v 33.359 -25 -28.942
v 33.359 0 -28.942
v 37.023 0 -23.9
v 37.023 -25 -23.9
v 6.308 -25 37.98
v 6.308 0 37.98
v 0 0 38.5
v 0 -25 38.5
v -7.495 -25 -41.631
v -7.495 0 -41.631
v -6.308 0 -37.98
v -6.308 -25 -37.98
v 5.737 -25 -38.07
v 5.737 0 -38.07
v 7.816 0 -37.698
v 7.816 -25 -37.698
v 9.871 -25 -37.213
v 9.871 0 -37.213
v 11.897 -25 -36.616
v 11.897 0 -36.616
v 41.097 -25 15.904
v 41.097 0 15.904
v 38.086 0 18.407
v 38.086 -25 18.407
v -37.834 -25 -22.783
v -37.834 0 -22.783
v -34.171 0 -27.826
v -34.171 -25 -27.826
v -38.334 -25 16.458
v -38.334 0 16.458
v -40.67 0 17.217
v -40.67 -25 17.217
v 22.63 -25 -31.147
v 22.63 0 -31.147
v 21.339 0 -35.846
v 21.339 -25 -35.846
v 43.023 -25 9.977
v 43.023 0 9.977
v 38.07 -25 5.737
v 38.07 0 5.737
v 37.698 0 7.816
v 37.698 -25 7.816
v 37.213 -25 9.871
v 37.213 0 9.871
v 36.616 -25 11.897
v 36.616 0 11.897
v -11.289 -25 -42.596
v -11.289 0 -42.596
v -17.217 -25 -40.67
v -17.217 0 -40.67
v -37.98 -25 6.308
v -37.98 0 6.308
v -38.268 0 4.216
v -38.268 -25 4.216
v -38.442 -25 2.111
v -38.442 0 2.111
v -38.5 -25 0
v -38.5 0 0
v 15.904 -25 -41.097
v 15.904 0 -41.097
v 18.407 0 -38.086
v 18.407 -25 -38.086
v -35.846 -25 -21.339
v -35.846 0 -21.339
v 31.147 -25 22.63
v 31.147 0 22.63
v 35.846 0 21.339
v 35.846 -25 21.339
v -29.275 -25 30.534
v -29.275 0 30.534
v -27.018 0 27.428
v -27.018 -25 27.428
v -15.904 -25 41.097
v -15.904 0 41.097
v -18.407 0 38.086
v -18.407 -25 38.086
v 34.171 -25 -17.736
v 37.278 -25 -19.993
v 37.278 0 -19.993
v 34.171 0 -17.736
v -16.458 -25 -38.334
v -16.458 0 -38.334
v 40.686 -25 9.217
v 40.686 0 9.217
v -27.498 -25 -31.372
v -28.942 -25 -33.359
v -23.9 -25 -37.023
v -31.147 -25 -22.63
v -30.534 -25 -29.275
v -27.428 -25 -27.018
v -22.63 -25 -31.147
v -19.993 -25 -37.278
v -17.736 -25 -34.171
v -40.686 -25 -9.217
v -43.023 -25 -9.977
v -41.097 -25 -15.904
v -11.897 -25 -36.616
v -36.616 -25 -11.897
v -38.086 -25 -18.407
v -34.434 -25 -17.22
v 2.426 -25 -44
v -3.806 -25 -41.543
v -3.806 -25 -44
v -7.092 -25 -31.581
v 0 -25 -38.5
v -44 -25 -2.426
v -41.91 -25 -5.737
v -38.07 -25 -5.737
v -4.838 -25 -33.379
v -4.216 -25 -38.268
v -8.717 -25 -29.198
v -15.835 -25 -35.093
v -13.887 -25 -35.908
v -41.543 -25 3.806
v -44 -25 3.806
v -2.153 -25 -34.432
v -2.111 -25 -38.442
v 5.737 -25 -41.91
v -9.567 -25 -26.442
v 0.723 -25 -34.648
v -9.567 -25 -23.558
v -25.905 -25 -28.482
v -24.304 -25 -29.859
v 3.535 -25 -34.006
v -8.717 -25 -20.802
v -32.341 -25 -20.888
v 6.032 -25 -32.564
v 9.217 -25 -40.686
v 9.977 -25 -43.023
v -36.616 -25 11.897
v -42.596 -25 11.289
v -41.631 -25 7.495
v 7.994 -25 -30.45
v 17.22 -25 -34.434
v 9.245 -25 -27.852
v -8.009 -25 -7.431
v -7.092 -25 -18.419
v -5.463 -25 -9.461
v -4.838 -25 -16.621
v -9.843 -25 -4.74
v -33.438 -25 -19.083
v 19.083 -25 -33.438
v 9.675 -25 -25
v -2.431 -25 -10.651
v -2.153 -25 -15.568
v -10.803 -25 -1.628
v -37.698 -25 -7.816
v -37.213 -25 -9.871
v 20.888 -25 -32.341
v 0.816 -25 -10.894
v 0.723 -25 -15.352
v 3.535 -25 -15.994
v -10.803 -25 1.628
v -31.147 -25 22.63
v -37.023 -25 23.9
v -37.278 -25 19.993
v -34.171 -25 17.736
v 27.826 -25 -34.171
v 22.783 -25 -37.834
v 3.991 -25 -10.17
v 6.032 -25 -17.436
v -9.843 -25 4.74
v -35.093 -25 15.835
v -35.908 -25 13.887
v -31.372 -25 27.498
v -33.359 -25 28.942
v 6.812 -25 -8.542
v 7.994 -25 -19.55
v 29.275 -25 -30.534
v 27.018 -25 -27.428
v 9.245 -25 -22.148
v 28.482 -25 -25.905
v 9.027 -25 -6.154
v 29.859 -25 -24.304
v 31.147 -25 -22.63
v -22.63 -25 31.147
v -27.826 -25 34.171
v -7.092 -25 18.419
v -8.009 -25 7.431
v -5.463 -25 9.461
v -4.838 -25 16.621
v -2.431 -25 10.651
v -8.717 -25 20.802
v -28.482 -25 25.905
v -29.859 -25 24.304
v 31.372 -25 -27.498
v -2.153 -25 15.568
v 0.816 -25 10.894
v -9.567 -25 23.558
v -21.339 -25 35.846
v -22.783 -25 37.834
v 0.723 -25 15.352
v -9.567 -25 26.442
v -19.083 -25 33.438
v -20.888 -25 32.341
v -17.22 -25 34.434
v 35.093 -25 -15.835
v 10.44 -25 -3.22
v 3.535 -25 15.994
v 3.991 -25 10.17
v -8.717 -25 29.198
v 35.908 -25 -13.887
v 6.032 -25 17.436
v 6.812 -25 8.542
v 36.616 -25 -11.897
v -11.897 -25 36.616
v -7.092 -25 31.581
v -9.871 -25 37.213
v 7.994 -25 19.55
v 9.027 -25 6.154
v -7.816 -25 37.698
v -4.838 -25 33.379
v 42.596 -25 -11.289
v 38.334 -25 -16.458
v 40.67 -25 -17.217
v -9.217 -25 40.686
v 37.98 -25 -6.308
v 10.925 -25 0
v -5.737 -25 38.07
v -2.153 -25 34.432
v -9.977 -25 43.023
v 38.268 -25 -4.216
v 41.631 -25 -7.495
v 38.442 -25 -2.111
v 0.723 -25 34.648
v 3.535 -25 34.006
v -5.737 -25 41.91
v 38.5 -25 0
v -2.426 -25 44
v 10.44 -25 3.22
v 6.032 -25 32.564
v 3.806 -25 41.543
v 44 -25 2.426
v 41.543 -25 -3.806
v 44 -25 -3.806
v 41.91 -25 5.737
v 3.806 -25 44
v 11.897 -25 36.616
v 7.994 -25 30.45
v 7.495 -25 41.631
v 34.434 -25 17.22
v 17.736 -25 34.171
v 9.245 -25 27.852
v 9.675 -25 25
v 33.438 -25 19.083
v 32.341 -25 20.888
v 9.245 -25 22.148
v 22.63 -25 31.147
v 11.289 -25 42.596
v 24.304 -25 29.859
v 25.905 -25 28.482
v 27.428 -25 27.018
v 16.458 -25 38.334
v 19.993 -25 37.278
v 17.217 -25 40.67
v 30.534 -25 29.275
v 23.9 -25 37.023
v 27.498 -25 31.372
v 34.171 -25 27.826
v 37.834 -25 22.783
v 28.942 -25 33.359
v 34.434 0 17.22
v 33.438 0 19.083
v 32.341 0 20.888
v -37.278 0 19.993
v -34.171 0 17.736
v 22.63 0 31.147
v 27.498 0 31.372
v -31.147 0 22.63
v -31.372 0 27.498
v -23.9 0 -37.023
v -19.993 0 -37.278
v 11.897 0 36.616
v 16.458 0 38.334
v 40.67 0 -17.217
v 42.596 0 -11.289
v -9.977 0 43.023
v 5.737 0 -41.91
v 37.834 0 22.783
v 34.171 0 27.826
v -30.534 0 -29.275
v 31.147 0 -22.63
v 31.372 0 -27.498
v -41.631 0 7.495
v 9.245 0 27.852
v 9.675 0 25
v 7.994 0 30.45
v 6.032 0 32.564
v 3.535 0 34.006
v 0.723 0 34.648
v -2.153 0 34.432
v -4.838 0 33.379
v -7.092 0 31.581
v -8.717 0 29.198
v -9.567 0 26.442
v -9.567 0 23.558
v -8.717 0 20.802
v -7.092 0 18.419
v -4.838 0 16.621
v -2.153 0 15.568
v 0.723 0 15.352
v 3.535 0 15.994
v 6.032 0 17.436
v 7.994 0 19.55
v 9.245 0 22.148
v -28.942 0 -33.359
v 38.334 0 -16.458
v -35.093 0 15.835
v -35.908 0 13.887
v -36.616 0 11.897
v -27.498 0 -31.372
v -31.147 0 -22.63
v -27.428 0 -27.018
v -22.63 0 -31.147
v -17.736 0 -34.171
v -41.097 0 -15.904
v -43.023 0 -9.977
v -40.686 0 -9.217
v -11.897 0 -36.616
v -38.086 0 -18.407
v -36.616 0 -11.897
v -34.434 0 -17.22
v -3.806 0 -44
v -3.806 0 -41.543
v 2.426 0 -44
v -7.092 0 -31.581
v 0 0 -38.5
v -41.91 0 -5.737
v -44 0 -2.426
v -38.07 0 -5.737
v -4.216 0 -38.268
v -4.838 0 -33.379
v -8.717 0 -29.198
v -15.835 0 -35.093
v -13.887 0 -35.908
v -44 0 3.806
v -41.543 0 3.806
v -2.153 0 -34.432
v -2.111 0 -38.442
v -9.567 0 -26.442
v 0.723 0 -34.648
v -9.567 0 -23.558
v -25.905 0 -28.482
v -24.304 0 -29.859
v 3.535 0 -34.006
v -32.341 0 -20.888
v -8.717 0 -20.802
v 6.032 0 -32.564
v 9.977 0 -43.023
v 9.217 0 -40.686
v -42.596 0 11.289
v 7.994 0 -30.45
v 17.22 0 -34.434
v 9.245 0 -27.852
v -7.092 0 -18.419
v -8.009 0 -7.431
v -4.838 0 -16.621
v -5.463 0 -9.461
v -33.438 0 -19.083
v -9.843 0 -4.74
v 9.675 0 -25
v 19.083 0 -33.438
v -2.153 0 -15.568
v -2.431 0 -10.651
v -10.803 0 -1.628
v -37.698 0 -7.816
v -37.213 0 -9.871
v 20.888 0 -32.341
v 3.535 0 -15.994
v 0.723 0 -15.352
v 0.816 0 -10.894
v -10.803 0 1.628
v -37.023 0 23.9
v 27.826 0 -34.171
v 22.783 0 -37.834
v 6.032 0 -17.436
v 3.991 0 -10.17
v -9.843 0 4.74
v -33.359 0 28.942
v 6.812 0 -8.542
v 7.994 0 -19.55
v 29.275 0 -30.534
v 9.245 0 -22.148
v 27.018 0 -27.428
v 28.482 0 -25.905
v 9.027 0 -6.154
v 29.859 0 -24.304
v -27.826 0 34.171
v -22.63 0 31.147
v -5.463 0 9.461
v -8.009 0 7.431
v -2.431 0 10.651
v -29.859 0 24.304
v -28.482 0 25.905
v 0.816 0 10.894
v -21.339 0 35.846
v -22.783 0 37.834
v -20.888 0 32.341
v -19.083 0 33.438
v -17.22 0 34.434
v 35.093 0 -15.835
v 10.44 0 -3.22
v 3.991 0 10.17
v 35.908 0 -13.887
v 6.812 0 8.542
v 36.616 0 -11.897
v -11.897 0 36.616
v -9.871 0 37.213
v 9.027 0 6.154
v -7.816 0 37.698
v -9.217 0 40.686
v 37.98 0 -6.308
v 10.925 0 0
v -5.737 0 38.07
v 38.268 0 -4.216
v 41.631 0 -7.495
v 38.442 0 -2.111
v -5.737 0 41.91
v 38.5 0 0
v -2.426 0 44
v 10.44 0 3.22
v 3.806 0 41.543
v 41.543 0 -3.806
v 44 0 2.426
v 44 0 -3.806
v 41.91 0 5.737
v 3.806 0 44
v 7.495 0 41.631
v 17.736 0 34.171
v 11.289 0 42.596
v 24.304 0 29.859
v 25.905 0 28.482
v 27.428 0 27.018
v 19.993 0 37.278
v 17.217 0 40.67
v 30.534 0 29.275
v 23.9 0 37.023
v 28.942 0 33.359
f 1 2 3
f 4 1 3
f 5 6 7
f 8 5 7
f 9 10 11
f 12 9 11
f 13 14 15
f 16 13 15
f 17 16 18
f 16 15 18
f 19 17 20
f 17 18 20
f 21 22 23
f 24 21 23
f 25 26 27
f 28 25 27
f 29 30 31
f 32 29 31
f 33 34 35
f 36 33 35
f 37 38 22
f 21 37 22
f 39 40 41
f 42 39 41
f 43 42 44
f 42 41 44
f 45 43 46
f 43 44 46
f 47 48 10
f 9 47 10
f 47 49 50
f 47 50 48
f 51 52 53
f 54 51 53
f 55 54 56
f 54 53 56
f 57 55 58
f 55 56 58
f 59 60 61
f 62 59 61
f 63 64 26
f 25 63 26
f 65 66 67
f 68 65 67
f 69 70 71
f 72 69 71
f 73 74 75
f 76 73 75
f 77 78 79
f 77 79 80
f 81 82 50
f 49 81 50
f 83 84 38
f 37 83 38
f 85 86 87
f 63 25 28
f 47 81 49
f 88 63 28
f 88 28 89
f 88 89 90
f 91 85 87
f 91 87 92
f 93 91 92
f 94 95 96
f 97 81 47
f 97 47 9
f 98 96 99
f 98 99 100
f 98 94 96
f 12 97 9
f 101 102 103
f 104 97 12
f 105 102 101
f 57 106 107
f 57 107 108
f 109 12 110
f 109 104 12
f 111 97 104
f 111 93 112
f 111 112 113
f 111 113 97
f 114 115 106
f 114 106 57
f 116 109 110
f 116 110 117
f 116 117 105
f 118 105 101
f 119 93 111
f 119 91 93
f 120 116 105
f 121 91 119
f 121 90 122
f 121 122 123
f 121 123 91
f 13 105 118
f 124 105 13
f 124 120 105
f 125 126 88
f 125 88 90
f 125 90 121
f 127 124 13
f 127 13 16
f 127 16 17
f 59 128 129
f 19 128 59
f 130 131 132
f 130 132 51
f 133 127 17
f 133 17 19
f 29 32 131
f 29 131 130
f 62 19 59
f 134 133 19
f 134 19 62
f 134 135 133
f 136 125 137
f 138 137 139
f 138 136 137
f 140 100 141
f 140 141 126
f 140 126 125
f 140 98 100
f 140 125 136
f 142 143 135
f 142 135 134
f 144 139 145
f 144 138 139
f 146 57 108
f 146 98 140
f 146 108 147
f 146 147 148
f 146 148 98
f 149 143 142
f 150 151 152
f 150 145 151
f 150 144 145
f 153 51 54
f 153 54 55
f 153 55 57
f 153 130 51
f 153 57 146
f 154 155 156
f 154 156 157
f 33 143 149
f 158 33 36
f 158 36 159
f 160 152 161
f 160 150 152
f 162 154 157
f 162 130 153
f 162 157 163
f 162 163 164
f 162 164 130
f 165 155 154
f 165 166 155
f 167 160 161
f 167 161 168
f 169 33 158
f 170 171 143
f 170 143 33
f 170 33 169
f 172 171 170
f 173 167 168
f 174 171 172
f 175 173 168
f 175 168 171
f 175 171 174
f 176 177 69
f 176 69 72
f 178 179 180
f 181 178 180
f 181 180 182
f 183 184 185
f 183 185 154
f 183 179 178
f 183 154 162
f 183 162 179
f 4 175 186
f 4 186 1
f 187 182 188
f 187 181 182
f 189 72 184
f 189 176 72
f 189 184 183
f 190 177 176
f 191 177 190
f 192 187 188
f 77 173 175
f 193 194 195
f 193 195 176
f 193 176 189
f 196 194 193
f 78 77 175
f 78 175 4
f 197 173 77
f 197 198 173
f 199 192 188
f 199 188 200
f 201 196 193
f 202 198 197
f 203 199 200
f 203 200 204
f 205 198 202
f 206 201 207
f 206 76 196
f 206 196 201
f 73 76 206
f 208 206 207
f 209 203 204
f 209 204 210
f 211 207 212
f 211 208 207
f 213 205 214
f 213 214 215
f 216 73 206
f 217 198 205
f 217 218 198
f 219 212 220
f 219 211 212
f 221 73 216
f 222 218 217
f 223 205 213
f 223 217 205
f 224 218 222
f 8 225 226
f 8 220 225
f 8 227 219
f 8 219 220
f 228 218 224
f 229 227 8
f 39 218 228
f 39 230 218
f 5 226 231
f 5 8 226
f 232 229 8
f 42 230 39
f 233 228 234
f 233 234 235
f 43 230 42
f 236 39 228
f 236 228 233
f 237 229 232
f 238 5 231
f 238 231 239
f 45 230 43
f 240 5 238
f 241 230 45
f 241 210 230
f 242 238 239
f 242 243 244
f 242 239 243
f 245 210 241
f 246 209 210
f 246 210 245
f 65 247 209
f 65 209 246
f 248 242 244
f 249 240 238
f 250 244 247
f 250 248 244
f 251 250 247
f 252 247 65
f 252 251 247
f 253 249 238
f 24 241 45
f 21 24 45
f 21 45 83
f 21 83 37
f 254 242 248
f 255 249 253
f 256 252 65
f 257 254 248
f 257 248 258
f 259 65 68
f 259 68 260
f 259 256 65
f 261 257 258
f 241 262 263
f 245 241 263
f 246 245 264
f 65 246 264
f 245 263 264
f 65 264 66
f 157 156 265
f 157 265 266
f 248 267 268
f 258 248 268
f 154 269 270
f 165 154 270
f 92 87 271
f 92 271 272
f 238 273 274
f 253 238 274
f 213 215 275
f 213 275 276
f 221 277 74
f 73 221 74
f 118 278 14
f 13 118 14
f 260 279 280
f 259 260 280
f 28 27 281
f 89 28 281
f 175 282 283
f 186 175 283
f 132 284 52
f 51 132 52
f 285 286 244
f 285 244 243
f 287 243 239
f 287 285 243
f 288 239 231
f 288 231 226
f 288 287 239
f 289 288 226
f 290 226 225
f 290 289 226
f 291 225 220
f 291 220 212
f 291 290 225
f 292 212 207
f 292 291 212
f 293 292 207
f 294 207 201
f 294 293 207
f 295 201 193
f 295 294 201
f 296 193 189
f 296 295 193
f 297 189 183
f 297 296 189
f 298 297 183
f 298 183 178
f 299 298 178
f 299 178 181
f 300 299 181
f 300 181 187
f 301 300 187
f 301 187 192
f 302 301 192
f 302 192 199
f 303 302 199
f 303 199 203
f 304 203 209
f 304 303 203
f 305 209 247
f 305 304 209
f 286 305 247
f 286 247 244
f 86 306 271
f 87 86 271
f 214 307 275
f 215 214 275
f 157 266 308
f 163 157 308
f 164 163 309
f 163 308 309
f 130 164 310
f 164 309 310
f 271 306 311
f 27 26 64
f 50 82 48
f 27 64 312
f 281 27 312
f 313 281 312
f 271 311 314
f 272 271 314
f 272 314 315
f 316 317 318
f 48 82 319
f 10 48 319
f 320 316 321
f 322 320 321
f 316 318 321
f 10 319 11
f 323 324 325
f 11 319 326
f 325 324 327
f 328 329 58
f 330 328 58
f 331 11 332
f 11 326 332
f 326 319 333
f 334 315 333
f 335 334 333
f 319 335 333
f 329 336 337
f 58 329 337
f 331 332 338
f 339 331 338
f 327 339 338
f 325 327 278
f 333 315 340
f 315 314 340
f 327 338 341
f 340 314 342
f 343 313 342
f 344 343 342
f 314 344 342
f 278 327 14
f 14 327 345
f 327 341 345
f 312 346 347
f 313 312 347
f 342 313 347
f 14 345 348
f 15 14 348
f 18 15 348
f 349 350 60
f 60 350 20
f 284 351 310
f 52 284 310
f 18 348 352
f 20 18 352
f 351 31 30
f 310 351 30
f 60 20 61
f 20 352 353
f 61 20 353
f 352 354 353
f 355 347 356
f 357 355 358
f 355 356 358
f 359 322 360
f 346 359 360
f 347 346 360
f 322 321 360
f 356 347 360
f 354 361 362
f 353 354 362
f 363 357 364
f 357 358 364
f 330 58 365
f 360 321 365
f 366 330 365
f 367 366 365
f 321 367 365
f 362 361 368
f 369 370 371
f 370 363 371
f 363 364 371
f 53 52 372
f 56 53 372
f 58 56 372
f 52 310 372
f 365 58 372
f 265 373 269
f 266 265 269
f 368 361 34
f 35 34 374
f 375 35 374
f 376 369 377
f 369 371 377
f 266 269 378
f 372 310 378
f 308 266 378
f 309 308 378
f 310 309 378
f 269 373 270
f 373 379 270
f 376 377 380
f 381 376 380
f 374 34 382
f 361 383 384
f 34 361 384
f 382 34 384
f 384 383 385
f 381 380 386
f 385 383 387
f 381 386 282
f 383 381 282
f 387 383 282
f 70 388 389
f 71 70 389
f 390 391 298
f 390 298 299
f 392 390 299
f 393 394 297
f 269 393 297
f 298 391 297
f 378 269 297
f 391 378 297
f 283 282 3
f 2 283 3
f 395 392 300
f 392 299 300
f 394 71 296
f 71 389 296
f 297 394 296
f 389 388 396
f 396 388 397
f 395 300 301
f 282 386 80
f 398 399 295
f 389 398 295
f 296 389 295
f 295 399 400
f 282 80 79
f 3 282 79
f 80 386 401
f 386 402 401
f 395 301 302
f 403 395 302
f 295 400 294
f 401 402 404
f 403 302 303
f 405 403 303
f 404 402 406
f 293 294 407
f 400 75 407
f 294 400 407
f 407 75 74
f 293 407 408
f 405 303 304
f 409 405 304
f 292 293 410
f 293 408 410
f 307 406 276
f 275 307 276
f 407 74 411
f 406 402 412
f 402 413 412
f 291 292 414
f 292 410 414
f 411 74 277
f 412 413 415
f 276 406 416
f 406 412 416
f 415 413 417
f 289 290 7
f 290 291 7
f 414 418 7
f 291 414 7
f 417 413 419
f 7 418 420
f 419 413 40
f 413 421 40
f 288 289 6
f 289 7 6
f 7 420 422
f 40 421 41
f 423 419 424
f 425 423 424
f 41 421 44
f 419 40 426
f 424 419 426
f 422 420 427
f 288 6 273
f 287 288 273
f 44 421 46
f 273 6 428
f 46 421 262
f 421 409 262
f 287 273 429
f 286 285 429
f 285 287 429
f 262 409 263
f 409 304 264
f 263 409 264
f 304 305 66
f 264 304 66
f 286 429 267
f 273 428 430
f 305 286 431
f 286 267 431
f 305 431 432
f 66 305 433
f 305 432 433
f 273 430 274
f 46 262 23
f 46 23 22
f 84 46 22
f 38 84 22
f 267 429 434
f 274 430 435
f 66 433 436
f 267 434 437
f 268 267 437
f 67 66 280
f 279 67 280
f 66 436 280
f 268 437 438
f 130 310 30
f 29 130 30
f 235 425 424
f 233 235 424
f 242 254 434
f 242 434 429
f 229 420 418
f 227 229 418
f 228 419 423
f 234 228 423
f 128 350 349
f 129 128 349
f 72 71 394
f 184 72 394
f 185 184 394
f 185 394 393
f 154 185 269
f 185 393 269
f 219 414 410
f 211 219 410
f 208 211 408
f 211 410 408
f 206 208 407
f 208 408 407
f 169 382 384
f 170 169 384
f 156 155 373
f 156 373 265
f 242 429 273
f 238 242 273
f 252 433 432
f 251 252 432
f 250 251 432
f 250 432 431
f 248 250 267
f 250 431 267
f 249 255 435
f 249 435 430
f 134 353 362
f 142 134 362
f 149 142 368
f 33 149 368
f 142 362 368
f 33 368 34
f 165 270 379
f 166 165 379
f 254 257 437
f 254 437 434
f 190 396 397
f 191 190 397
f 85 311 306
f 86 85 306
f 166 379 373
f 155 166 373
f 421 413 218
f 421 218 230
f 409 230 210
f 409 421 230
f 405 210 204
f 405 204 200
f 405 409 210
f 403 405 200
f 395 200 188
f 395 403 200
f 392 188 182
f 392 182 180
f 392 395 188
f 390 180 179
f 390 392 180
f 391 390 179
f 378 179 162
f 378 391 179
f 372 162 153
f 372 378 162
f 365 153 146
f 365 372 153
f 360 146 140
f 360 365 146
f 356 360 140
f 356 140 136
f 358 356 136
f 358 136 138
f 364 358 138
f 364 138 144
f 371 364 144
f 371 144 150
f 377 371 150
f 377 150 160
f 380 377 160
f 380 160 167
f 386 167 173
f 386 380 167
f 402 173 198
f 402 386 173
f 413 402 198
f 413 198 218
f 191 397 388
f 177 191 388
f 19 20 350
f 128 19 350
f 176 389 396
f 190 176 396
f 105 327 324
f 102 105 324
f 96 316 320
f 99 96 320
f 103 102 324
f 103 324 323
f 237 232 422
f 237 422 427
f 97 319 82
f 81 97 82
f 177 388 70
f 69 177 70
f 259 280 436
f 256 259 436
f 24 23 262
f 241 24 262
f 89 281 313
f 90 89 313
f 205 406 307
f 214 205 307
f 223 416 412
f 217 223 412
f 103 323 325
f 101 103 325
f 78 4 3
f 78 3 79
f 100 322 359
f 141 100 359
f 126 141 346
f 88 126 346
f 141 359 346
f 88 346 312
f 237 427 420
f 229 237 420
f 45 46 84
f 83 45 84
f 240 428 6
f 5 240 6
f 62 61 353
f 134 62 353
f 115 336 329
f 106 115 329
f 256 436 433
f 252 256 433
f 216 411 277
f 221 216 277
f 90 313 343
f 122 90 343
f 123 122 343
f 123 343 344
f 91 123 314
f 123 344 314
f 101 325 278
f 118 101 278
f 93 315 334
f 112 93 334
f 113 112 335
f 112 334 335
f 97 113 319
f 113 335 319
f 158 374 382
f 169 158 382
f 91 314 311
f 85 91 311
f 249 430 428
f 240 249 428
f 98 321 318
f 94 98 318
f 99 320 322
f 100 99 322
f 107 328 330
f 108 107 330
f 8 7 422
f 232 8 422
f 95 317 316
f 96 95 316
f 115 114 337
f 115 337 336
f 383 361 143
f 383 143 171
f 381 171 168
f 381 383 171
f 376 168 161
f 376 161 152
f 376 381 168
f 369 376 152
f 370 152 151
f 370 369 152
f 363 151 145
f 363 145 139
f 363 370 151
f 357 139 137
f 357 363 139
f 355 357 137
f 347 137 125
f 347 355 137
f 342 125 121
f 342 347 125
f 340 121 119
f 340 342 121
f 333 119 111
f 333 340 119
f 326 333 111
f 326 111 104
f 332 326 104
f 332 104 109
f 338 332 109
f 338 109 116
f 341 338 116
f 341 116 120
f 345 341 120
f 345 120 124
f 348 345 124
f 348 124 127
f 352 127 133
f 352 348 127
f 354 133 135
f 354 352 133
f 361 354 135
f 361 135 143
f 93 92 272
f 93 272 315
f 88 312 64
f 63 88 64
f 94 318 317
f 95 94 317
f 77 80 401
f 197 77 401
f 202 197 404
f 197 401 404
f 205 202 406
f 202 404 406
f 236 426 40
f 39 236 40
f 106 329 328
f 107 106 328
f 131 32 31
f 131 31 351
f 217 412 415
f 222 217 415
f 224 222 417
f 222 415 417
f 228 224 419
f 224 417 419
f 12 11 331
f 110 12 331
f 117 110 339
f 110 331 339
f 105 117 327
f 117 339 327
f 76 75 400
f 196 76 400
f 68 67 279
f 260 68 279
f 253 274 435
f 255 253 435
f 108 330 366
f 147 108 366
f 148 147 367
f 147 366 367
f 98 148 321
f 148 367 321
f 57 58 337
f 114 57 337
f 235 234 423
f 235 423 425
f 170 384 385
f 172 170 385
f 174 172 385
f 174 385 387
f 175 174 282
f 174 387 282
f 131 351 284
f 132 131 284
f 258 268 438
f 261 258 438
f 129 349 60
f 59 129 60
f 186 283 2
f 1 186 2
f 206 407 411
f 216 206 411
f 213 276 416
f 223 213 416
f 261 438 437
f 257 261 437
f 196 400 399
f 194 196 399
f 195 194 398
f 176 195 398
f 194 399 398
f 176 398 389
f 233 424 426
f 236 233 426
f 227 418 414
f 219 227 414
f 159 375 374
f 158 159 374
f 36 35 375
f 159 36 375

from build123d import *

# Parameters (mm, degrees)
F0_R     = 9.675
F0_R_2   = 10.925
F1_DEPTH = 25


with BuildPart() as f1:
    # F0 (on Front) → F1 (new body)
    with BuildSketch(Plane.XZ):
        with BuildLine():
            Line((3.806459, 44), (-2.426446, 44))
            Line((-2.426446, 44), (-5.736627, 41.90996))
            Line((-5.736627, 41.90996), (-5.736627, 38.070213))
            ThreePointArc((-5.736627, 38.070213), (-8.846834, 37.469768), (-11.897154, 36.615676))
            Line((-11.897154, 36.615676), (-9.217365, 40.686093))
            Line((-9.217365, 40.686093), (-9.97659, 43.022747))
            Line((-9.97659, 43.022747), (-15.904435, 41.096674))
            Line((-15.904435, 41.096674), (-18.406746, 38.086026))
            Line((-18.406746, 38.086026), (-17.220199, 34.434209))
            ThreePointArc((-17.220199, 34.434209), (-19.992635, 32.902045), (-22.629732, 31.147154))
            Line((-22.629732, 31.147154), (-21.338929, 35.846452))
            Line((-21.338929, 35.846452), (-22.783061, 37.834129))
            Line((-22.783061, 37.834129), (-27.825587, 34.170519))
            Line((-27.825587, 34.170519), (-29.275085, 30.533966))
            Line((-29.275085, 30.533966), (-27.018138, 27.427545))
            ThreePointArc((-27.018138, 27.427545), (-29.181416, 25.11364), (-31.147154, 22.629732))
            Line((-31.147154, 22.629732), (-31.37169, 27.49791))
            Line((-31.37169, 27.49791), (-33.359367, 28.942042))
            Line((-33.359367, 28.942042), (-37.022977, 23.899515))
            Line((-37.022977, 23.899515), (-37.277775, 19.993028))
            Line((-37.277775, 19.993028), (-34.171354, 17.736081))
            ThreePointArc((-34.171354, 17.736081), (-35.513718, 14.866938), (-36.615676, 11.897154))
            Line((-36.615676, 11.897154), (-38.333572, 16.457681))
            Line((-38.333572, 16.457681), (-40.670226, 17.216906))
            Line((-40.670226, 17.216906), (-42.5963, 11.289061))
            Line((-42.5963, 11.289061), (-41.631456, 7.495034))
            Line((-41.631456, 7.495034), (-37.979639, 6.308487))
            ThreePointArc((-37.979639, 6.308487), (-38.369689, 3.164956), (-38.5, 0))
            Line((-38.5, 0), (-41.543096, 3.806459))
            Line((-41.543096, 3.806459), (-44, 3.806459))
            Line((-44, 3.806459), (-44, -2.426446))
            Line((-44, -2.426446), (-41.90996, -5.736627))
            Line((-41.90996, -5.736627), (-38.070213, -5.736627))
            ThreePointArc((-38.070213, -5.736627), (-37.469768, -8.846834), (-36.615676, -11.897154))
            Line((-36.615676, -11.897154), (-40.686093, -9.217365))
            Line((-40.686093, -9.217365), (-43.022747, -9.97659))
            Line((-43.022747, -9.97659), (-41.096674, -15.904435))
            Line((-41.096674, -15.904435), (-38.086026, -18.406746))
            Line((-38.086026, -18.406746), (-34.434209, -17.220199))
            ThreePointArc((-34.434209, -17.220199), (-32.902045, -19.992635), (-31.147154, -22.629732))
            Line((-31.147154, -22.629732), (-35.846452, -21.338929))
            Line((-35.846452, -21.338929), (-37.834129, -22.783061))
            Line((-37.834129, -22.783061), (-34.170519, -27.825587))
            Line((-34.170519, -27.825587), (-30.533966, -29.275085))
            Line((-30.533966, -29.275085), (-27.427545, -27.018138))
            ThreePointArc((-27.427545, -27.018138), (-25.11364, -29.181416), (-22.629732, -31.147154))
            Line((-22.629732, -31.147154), (-27.49791, -31.37169))
            Line((-27.49791, -31.37169), (-28.942042, -33.359367))
            Line((-28.942042, -33.359367), (-23.899515, -37.022977))
            Line((-23.899515, -37.022977), (-19.993028, -37.277775))
            Line((-19.993028, -37.277775), (-17.736081, -34.171354))
            ThreePointArc((-17.736081, -34.171354), (-14.866938, -35.513718), (-11.897154, -36.615676))
            Line((-11.897154, -36.615676), (-16.457681, -38.333572))
            Line((-16.457681, -38.333572), (-17.216906, -40.670226))
            Line((-17.216906, -40.670226), (-11.289061, -42.5963))
            Line((-11.289061, -42.5963), (-7.495034, -41.631456))
            Line((-7.495034, -41.631456), (-6.308487, -37.979639))
            ThreePointArc((-6.308487, -37.979639), (-3.164956, -38.369689), (0, -38.5))
            Line((0, -38.5), (-3.806459, -41.543096))
            Line((-3.806459, -41.543096), (-3.806459, -44))
            Line((-3.806459, -44), (2.426446, -44))
            Line((2.426446, -44), (5.736627, -41.90996))
            Line((5.736627, -41.90996), (5.736627, -38.070213))
            ThreePointArc((5.736627, -38.070213), (8.846834, -37.469768), (11.897154, -36.615676))
            Line((11.897154, -36.615676), (9.217365, -40.686093))
            Line((9.217365, -40.686093), (9.97659, -43.022747))
            Line((9.97659, -43.022747), (15.904435, -41.096674))
            Line((15.904435, -41.096674), (18.406746, -38.086026))
            Line((18.406746, -38.086026), (17.220199, -34.434209))
            ThreePointArc((17.220199, -34.434209), (19.992635, -32.902045), (22.629732, -31.147154))
            Line((22.629732, -31.147154), (21.338929, -35.846452))
            Line((21.338929, -35.846452), (22.783061, -37.834129))
            Line((22.783061, -37.834129), (27.825587, -34.170519))
            Line((27.825587, -34.170519), (29.275085, -30.533966))
            Line((29.275085, -30.533966), (27.018138, -27.427545))
            ThreePointArc((27.018138, -27.427545), (29.181416, -25.11364), (31.147154, -22.629732))
            Line((31.147154, -22.629732), (31.37169, -27.49791))
            Line((31.37169, -27.49791), (33.359367, -28.942042))
            Line((33.359367, -28.942042), (37.022977, -23.899515))
            Line((37.022977, -23.899515), (37.277775, -19.993028))
            Line((37.277775, -19.993028), (34.171354, -17.736081))
            ThreePointArc((34.171354, -17.736081), (35.513718, -14.866938), (36.615676, -11.897154))
            Line((36.615676, -11.897154), (38.333572, -16.457681))
            Line((38.333572, -16.457681), (40.670226, -17.216906))
            Line((40.670226, -17.216906), (42.5963, -11.289061))
            Line((42.5963, -11.289061), (41.631456, -7.495034))
            Line((41.631456, -7.495034), (37.979639, -6.308487))
            ThreePointArc((37.979639, -6.308487), (38.369689, -3.164956), (38.5, 0))
            Line((38.5, 0), (41.543096, -3.806459))
            Line((41.543096, -3.806459), (44, -3.806459))
            Line((44, -3.806459), (44, 2.426446))
            Line((44, 2.426446), (41.90996, 5.736627))
            Line((41.90996, 5.736627), (38.070213, 5.736627))
            ThreePointArc((38.070213, 5.736627), (37.469768, 8.846834), (36.615676, 11.897154))
            Line((36.615676, 11.897154), (40.686093, 9.217365))
            Line((40.686093, 9.217365), (43.022747, 9.97659))
            Line((43.022747, 9.97659), (41.096674, 15.904435))
            Line((41.096674, 15.904435), (38.086026, 18.406746))
            Line((38.086026, 18.406746), (34.434209, 17.220199))
            ThreePointArc((34.434209, 17.220199), (32.902045, 19.992635), (31.147154, 22.629732))
            Line((31.147154, 22.629732), (35.846452, 21.338929))
            Line((35.846452, 21.338929), (37.834129, 22.783061))
            Line((37.834129, 22.783061), (34.170519, 27.825587))
            Line((34.170519, 27.825587), (30.533966, 29.275085))
            Line((30.533966, 29.275085), (27.427545, 27.018138))
            ThreePointArc((27.427545, 27.018138), (25.11364, 29.181416), (22.629732, 31.147154))
            Line((22.629732, 31.147154), (27.49791, 31.37169))
            Line((27.49791, 31.37169), (28.942042, 33.359367))
            Line((28.942042, 33.359367), (23.899515, 37.022977))
            Line((23.899515, 37.022977), (19.993028, 37.277775))
            Line((19.993028, 37.277775), (17.736081, 34.171354))
            Line((17.736081, 34.171354), (11.897154, 36.615676))
            Line((11.897154, 36.615676), (16.457681, 38.333572))
            Line((16.457681, 38.333572), (17.216906, 40.670226))
            Line((17.216906, 40.670226), (11.289061, 42.5963))
            Line((11.289061, 42.5963), (7.495034, 41.631456))
            Line((7.495034, 41.631456), (6.308487, 37.979639))
            Line((6.308487, 37.979639), (0, 38.5))
            Line((0, 38.5), (3.806459, 41.543096))
            Line((3.806459, 41.543096), (3.806459, 44))
        make_face()
        with Locations((0, -25)):
            Circle(F0_R, mode=Mode.SUBTRACT)
        Circle(F0_R_2, mode=Mode.SUBTRACT)
        with Locations((0, 25)):
            Circle(F0_R, mode=Mode.SUBTRACT)
    extrude(amount=F1_DEPTH)


solid = f1.part
